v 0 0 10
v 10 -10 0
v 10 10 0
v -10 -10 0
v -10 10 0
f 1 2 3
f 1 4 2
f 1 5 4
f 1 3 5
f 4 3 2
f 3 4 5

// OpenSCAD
// square pyramid: one quadrilateral face, four triangles
polyhedron(points = [[10, 10, 0], [10, -10, 0], [-10, -10, 0], [-10, 10, 0], [0, 0, 10]],
           faces = [[0, 1, 4], [1, 2, 4], [2, 3, 4], [3, 0, 4], [3, 2, 1, 0]]);
